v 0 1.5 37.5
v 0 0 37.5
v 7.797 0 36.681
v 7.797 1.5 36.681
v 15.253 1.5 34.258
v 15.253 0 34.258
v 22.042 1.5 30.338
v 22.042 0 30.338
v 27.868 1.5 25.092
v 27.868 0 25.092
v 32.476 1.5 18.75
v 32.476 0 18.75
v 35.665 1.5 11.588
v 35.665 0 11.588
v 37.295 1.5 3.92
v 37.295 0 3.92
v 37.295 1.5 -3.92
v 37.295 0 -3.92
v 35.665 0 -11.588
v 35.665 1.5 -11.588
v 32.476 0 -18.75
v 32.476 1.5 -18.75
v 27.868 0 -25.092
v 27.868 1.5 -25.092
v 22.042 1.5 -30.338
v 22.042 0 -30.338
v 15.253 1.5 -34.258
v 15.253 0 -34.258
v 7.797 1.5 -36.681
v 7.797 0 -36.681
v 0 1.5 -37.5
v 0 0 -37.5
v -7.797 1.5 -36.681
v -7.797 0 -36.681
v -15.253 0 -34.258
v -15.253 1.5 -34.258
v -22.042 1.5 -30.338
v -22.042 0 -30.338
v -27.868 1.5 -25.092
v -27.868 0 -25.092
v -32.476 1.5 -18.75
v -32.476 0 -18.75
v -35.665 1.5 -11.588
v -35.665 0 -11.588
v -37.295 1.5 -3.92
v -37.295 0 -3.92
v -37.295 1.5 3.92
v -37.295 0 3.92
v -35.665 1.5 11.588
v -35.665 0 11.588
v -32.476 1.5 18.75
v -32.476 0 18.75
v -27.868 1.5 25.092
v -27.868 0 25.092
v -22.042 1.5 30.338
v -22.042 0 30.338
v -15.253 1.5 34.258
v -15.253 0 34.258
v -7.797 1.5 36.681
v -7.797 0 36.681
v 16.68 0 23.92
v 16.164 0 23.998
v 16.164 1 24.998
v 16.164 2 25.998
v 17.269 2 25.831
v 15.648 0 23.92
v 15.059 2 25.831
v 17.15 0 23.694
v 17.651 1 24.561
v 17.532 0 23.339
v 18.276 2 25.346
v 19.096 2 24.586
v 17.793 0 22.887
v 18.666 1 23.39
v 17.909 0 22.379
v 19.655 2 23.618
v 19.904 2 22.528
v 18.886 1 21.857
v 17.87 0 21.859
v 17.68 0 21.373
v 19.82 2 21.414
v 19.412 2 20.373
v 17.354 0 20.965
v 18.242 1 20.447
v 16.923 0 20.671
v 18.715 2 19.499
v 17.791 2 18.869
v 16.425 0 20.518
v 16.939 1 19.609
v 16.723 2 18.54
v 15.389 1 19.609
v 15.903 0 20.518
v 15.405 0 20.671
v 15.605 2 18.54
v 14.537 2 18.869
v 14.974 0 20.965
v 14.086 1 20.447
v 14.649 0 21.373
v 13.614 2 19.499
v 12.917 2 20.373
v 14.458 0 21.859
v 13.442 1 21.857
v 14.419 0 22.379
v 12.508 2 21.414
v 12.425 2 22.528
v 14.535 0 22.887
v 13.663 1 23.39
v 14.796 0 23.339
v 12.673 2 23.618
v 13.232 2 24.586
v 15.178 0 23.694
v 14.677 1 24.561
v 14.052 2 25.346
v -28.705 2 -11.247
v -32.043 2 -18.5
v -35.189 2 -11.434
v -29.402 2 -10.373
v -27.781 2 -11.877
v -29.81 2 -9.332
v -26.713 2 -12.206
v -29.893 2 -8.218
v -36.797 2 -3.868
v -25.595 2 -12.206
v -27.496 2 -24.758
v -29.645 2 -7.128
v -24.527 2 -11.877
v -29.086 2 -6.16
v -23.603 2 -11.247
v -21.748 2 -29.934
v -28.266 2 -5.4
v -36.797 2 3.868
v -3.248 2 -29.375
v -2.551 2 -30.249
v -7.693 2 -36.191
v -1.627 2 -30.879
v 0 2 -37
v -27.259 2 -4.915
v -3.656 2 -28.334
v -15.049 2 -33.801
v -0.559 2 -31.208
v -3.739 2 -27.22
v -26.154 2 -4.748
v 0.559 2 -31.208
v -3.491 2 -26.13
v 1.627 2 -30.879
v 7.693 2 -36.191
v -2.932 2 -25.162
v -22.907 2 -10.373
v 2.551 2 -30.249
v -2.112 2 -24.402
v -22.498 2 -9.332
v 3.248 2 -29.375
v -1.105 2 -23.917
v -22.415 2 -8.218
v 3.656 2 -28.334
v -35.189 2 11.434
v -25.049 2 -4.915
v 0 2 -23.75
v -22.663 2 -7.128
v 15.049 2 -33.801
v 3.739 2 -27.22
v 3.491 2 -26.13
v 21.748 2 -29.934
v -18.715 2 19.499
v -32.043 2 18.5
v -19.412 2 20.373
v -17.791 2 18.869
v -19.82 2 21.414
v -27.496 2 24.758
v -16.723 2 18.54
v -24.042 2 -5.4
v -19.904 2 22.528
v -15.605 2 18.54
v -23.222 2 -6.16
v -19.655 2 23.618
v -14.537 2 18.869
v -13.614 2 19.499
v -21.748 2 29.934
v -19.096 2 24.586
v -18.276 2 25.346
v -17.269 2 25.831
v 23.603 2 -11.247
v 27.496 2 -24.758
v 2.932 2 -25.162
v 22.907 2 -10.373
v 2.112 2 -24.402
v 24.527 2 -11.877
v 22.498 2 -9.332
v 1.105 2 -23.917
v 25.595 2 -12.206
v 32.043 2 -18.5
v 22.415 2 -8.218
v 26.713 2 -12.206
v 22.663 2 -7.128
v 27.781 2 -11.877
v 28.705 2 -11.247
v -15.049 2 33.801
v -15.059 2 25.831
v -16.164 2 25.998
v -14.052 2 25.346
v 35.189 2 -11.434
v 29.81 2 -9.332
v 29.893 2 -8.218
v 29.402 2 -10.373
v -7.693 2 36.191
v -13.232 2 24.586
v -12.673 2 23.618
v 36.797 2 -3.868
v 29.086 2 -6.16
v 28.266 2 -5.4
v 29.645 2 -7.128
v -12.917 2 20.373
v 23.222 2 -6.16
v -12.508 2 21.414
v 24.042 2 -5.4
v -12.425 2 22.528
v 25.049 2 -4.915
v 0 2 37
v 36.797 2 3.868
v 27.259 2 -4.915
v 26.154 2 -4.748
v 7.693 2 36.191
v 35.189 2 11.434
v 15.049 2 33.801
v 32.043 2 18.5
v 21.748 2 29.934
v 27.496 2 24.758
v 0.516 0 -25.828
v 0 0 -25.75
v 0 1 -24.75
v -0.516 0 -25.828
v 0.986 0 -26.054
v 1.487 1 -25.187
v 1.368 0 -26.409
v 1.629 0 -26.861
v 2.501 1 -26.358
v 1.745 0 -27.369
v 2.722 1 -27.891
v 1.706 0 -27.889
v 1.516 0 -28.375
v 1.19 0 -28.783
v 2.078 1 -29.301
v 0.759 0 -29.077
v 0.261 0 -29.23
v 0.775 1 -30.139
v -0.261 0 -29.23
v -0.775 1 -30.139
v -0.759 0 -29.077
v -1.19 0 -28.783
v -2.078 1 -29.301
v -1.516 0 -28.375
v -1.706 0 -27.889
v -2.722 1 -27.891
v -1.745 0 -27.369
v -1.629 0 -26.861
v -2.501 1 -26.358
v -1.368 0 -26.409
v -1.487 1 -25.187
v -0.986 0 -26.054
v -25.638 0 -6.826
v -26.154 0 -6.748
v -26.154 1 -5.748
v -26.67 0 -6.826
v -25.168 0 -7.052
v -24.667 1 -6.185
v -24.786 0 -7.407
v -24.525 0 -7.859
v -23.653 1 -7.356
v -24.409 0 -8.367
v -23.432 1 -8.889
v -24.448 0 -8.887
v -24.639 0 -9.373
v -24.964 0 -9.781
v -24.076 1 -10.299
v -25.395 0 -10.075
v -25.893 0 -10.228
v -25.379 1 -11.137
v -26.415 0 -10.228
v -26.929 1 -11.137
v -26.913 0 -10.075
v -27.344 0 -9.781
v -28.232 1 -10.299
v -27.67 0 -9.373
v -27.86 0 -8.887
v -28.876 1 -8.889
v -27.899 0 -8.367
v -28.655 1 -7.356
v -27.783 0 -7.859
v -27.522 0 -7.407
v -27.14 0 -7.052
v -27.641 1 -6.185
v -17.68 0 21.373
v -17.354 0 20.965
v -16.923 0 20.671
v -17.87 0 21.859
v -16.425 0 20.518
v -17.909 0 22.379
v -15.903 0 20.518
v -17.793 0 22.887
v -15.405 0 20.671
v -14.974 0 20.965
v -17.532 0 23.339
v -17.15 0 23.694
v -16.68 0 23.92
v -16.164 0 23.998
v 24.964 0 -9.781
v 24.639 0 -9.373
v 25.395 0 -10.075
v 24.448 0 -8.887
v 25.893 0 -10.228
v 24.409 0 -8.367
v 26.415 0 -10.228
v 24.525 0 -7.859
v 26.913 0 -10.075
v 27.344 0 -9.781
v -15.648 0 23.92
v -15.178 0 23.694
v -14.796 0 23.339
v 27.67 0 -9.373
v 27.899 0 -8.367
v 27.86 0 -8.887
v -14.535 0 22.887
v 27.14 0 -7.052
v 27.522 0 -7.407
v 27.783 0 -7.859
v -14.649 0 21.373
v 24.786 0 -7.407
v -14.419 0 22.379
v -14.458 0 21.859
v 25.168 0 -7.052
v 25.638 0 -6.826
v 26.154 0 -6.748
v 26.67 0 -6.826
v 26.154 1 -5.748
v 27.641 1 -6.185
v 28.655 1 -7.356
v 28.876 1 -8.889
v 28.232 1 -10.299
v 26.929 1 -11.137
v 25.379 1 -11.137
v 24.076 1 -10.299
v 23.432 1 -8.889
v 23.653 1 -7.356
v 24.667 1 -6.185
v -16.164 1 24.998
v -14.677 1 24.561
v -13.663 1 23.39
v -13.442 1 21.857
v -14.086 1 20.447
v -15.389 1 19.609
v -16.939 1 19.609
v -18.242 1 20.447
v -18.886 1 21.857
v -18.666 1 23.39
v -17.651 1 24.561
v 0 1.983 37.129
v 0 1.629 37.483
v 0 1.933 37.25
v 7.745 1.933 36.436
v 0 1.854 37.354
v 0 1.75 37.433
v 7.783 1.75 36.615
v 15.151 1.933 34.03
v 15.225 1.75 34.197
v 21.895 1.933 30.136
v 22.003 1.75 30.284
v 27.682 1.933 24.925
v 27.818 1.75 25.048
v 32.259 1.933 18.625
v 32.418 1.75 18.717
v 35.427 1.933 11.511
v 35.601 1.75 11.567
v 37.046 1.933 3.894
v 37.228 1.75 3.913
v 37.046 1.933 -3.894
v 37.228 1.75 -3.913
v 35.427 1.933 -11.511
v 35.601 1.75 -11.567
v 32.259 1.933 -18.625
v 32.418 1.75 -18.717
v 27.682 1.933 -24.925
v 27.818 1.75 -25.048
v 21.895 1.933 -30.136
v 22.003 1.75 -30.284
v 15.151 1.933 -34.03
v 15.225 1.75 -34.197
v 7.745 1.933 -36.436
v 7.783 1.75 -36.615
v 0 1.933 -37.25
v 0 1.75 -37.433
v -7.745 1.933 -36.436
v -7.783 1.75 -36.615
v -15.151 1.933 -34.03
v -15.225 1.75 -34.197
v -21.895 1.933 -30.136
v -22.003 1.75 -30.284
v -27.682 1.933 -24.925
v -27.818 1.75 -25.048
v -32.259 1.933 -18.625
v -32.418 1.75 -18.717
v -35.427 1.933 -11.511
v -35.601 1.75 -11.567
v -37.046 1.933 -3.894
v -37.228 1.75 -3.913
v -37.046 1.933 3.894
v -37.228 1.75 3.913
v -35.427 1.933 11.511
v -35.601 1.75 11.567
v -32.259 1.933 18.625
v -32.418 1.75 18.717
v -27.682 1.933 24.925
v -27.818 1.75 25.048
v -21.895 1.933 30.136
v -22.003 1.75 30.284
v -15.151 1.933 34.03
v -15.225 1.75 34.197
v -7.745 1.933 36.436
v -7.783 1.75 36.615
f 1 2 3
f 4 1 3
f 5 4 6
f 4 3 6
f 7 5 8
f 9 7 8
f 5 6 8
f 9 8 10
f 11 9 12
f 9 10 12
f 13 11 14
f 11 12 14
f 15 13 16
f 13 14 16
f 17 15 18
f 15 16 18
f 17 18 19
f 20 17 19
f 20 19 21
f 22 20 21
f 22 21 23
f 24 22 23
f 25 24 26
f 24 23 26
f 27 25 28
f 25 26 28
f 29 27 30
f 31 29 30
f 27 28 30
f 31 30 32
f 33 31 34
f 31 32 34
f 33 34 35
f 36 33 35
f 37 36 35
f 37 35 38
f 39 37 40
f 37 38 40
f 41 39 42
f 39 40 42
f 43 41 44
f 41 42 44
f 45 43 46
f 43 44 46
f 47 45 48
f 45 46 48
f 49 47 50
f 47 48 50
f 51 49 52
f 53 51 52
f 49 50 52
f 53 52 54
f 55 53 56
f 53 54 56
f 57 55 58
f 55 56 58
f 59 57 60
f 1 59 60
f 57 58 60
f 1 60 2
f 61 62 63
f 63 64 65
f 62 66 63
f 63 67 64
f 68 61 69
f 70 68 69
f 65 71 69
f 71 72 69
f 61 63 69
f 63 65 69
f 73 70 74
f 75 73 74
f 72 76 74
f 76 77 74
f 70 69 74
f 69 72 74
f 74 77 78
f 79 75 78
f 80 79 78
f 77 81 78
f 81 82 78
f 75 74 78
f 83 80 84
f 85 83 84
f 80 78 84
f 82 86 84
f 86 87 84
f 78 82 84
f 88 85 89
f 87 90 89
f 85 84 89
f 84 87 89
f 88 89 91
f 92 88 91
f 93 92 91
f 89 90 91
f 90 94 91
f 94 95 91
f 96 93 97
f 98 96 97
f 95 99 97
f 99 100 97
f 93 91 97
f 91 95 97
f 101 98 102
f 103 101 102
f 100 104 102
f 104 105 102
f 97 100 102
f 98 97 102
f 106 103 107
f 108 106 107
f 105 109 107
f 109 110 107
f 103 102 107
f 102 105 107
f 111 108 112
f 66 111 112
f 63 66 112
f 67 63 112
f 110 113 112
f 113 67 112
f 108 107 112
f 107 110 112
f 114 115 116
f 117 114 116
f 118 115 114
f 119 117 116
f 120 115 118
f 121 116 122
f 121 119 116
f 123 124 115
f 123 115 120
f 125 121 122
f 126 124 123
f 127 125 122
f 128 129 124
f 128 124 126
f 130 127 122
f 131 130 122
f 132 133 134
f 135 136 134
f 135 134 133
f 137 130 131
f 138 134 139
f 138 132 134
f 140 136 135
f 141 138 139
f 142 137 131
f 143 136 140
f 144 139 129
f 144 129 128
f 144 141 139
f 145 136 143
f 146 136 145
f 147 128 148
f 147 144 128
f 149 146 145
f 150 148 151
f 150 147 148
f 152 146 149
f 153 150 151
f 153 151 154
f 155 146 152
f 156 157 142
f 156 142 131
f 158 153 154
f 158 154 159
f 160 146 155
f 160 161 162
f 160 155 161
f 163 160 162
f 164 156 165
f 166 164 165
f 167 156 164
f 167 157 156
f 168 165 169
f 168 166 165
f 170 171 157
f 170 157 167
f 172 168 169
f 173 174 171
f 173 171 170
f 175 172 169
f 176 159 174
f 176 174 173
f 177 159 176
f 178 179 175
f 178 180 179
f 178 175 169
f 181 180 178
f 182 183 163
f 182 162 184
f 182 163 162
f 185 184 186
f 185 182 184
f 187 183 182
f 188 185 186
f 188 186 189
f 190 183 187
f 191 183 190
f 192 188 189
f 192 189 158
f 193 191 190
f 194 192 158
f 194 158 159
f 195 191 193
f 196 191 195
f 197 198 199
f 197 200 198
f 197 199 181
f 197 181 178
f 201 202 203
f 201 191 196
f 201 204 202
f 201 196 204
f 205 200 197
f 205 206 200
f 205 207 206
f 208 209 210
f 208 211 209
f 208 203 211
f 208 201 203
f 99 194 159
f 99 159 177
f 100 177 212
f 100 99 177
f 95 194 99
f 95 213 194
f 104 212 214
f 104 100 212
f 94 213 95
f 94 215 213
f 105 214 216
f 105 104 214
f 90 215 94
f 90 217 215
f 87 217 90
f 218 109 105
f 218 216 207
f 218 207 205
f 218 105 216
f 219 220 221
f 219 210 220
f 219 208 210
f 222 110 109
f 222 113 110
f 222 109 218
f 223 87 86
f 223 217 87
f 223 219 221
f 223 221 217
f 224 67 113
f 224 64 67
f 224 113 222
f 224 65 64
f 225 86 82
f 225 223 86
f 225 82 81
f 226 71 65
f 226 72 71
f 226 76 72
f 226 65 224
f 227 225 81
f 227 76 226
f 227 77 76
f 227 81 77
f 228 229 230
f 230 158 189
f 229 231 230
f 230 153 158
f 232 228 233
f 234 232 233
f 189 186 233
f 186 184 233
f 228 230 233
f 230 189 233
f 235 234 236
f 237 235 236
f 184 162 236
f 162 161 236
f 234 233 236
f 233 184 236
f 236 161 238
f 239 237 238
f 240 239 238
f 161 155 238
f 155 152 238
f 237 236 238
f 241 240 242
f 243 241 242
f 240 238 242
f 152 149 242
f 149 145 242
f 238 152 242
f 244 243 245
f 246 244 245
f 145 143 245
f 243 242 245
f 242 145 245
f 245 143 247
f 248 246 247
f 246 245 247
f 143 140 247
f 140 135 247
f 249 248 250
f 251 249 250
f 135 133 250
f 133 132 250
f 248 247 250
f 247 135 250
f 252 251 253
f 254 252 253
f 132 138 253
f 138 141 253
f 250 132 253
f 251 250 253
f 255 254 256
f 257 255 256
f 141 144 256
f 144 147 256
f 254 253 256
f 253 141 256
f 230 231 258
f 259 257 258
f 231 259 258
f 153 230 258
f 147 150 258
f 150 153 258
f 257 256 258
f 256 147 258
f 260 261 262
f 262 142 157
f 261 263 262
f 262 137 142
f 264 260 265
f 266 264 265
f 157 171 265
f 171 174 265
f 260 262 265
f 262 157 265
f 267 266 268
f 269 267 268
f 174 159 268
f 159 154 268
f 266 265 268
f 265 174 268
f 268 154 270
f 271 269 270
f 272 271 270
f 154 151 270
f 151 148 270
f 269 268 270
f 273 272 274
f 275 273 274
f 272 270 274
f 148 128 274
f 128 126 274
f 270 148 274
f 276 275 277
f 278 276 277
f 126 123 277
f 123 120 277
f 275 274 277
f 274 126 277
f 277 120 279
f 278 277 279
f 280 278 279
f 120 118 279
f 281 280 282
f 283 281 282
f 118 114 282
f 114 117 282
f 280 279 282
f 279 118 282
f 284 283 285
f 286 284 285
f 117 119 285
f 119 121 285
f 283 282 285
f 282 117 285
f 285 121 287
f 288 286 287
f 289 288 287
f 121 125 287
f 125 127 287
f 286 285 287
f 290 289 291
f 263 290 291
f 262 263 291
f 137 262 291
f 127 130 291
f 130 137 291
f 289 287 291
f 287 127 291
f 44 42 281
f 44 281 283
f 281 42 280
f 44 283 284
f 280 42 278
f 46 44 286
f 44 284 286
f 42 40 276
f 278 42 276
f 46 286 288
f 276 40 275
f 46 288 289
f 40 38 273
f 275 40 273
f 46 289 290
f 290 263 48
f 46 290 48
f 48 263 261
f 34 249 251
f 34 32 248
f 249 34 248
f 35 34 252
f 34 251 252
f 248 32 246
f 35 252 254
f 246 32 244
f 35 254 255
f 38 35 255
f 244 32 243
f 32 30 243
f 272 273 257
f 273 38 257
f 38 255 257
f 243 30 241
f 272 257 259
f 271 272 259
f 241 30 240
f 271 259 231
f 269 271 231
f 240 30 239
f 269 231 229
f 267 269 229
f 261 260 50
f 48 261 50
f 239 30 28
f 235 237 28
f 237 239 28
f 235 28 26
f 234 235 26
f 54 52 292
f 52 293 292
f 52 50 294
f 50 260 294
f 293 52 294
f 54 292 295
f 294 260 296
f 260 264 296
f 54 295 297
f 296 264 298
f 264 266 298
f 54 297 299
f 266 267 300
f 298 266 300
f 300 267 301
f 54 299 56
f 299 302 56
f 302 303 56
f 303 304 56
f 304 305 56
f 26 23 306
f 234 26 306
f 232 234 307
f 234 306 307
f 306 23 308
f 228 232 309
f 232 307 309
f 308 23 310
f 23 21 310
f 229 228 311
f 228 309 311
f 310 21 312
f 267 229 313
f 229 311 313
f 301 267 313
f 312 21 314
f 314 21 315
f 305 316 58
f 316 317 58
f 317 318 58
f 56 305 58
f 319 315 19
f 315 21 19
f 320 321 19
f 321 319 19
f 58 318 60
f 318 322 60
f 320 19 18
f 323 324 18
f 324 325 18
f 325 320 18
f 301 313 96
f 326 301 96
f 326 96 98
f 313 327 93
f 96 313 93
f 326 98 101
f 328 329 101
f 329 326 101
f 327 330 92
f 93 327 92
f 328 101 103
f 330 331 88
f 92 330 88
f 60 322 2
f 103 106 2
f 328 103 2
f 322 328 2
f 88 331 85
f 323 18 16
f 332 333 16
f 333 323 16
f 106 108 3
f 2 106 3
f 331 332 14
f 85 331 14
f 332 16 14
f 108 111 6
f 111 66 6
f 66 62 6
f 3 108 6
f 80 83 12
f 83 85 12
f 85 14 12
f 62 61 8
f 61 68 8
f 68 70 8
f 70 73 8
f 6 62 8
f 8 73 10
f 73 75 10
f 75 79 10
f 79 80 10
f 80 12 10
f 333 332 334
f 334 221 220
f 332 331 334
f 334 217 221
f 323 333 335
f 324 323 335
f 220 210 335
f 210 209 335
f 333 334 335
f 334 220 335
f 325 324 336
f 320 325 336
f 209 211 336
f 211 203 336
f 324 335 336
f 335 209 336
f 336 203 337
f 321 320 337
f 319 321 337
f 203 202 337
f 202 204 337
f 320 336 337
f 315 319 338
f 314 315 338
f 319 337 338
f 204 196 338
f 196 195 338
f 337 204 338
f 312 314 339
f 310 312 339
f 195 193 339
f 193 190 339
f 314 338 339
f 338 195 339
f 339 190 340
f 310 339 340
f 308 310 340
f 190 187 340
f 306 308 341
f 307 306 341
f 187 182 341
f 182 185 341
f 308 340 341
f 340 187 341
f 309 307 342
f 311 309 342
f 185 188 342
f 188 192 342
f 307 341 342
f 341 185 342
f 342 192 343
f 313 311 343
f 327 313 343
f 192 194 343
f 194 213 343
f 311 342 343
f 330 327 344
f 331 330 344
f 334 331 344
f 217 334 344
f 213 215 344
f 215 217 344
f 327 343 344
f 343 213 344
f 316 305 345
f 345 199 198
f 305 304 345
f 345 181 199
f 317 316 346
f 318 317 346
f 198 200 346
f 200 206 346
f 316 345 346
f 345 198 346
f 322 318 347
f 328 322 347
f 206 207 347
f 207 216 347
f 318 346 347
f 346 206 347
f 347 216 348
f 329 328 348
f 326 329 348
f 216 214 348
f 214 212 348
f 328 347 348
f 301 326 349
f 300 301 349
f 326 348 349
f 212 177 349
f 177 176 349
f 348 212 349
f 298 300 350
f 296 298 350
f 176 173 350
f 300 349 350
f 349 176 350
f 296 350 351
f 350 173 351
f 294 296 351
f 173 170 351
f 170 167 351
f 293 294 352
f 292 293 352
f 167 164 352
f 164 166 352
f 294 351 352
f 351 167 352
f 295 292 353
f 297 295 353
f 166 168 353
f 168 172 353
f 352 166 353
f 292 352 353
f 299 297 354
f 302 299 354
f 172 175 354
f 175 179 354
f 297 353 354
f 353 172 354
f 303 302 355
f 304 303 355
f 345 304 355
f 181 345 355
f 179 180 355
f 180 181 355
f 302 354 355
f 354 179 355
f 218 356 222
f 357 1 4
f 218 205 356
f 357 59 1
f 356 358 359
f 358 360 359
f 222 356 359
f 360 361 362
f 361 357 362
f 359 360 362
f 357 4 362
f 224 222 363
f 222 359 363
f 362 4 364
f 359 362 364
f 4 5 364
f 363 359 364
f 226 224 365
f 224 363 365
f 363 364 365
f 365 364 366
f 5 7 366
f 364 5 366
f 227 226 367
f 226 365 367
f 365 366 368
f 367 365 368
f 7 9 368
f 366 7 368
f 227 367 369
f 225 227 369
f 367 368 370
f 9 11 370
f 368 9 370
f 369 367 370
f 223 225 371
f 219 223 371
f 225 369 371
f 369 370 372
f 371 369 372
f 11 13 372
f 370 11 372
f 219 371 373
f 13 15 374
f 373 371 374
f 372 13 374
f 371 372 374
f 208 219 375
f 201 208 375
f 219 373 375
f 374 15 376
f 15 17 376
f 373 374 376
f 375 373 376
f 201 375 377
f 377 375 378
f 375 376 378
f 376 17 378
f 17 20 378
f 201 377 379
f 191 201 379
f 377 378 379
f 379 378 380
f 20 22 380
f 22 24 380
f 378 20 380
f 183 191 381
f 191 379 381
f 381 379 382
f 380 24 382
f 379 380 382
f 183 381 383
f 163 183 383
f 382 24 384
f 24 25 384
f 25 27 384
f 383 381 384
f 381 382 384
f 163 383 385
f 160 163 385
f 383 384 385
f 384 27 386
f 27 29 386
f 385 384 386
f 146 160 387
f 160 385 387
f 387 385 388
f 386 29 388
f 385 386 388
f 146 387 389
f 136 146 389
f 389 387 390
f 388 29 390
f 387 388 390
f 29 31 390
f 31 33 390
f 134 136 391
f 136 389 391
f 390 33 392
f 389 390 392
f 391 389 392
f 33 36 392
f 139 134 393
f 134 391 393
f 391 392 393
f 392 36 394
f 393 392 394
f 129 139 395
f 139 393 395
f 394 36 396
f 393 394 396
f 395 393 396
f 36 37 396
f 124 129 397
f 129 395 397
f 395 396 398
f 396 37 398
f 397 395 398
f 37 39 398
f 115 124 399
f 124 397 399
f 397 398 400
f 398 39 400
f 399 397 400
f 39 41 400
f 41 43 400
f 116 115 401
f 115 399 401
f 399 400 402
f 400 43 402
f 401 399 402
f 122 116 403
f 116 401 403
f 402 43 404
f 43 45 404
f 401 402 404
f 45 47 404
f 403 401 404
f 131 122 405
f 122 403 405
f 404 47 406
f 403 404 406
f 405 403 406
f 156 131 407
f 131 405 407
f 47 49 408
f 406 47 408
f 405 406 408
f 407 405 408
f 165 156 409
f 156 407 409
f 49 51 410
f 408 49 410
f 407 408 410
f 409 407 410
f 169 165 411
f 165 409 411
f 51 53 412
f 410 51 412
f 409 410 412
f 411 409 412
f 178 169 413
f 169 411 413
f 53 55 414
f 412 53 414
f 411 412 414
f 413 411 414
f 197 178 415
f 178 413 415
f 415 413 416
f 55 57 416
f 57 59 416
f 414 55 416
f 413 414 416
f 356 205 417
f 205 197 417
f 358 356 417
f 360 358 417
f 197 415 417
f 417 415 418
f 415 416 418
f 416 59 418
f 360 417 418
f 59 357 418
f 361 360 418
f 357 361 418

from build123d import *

# Parameters (mm, degrees)
SKETCH2_R           = 37.5
SKETCH2_R_2         = 1.75
BOSS_EXTRUDE1_DEPTH = 2
CHAMFER1_SIZE       = 2
FILLET1_R           = 0.5


with BuildPart() as part:
    # Sketch2 → Boss-Extrude1 (new body)
    with BuildSketch(Plane(origin=(0, 0, 0), x_dir=(1, 0, 0), z_dir=(0, 1, 0))):
        with Locations(Location((0, 0, 0), (0, 0, 270))):
            Circle(SKETCH2_R)
        with Locations(Location((0, 27.5, 0), (0, 0, 270))):
            Circle(SKETCH2_R_2, mode=Mode.SUBTRACT)
        with Locations(Location((26.154054198, 8.497967345, 0), (0, 0, 270))):
            Circle(SKETCH2_R_2, mode=Mode.SUBTRACT)
        with Locations(Location((16.164094438, -22.247967345, 0), (0, 0, 270))):
            Circle(SKETCH2_R_2, mode=Mode.SUBTRACT)
        with Locations(Location((-16.164094438, -22.247967345, 0), (0, 0, 270))):
            Circle(SKETCH2_R_2, mode=Mode.SUBTRACT)
        with Locations(Location((-26.154054198, 8.497967345, 0), (0, 0, 270))):
            Circle(SKETCH2_R_2, mode=Mode.SUBTRACT)
    extrude(amount=BOSS_EXTRUDE1_DEPTH)

    # Chamfer1
    chamfer1_edges = [part.edges().sort_by_distance(p)[0] for p in [
        (-26.154054198, 2, -10.247967345),
        (0, 2, -29.25),
        (26.154054198, 2, -10.247967345),
        (16.164094438, 2, 20.497967345),
        (-16.164094438, 2, 20.497967345),
    ]]
    chamfer(chamfer1_edges, length=CHAMFER1_SIZE - 0.0001)  # a hair under: the kernel refuses the full size

    # Fillet1
    fillet1_edges = [part.edges().sort_by_distance(p)[0] for p in [
        (0, 2, -37.5),
    ]]
    fillet(fillet1_edges, radius=FILLET1_R)


solid = part.part
